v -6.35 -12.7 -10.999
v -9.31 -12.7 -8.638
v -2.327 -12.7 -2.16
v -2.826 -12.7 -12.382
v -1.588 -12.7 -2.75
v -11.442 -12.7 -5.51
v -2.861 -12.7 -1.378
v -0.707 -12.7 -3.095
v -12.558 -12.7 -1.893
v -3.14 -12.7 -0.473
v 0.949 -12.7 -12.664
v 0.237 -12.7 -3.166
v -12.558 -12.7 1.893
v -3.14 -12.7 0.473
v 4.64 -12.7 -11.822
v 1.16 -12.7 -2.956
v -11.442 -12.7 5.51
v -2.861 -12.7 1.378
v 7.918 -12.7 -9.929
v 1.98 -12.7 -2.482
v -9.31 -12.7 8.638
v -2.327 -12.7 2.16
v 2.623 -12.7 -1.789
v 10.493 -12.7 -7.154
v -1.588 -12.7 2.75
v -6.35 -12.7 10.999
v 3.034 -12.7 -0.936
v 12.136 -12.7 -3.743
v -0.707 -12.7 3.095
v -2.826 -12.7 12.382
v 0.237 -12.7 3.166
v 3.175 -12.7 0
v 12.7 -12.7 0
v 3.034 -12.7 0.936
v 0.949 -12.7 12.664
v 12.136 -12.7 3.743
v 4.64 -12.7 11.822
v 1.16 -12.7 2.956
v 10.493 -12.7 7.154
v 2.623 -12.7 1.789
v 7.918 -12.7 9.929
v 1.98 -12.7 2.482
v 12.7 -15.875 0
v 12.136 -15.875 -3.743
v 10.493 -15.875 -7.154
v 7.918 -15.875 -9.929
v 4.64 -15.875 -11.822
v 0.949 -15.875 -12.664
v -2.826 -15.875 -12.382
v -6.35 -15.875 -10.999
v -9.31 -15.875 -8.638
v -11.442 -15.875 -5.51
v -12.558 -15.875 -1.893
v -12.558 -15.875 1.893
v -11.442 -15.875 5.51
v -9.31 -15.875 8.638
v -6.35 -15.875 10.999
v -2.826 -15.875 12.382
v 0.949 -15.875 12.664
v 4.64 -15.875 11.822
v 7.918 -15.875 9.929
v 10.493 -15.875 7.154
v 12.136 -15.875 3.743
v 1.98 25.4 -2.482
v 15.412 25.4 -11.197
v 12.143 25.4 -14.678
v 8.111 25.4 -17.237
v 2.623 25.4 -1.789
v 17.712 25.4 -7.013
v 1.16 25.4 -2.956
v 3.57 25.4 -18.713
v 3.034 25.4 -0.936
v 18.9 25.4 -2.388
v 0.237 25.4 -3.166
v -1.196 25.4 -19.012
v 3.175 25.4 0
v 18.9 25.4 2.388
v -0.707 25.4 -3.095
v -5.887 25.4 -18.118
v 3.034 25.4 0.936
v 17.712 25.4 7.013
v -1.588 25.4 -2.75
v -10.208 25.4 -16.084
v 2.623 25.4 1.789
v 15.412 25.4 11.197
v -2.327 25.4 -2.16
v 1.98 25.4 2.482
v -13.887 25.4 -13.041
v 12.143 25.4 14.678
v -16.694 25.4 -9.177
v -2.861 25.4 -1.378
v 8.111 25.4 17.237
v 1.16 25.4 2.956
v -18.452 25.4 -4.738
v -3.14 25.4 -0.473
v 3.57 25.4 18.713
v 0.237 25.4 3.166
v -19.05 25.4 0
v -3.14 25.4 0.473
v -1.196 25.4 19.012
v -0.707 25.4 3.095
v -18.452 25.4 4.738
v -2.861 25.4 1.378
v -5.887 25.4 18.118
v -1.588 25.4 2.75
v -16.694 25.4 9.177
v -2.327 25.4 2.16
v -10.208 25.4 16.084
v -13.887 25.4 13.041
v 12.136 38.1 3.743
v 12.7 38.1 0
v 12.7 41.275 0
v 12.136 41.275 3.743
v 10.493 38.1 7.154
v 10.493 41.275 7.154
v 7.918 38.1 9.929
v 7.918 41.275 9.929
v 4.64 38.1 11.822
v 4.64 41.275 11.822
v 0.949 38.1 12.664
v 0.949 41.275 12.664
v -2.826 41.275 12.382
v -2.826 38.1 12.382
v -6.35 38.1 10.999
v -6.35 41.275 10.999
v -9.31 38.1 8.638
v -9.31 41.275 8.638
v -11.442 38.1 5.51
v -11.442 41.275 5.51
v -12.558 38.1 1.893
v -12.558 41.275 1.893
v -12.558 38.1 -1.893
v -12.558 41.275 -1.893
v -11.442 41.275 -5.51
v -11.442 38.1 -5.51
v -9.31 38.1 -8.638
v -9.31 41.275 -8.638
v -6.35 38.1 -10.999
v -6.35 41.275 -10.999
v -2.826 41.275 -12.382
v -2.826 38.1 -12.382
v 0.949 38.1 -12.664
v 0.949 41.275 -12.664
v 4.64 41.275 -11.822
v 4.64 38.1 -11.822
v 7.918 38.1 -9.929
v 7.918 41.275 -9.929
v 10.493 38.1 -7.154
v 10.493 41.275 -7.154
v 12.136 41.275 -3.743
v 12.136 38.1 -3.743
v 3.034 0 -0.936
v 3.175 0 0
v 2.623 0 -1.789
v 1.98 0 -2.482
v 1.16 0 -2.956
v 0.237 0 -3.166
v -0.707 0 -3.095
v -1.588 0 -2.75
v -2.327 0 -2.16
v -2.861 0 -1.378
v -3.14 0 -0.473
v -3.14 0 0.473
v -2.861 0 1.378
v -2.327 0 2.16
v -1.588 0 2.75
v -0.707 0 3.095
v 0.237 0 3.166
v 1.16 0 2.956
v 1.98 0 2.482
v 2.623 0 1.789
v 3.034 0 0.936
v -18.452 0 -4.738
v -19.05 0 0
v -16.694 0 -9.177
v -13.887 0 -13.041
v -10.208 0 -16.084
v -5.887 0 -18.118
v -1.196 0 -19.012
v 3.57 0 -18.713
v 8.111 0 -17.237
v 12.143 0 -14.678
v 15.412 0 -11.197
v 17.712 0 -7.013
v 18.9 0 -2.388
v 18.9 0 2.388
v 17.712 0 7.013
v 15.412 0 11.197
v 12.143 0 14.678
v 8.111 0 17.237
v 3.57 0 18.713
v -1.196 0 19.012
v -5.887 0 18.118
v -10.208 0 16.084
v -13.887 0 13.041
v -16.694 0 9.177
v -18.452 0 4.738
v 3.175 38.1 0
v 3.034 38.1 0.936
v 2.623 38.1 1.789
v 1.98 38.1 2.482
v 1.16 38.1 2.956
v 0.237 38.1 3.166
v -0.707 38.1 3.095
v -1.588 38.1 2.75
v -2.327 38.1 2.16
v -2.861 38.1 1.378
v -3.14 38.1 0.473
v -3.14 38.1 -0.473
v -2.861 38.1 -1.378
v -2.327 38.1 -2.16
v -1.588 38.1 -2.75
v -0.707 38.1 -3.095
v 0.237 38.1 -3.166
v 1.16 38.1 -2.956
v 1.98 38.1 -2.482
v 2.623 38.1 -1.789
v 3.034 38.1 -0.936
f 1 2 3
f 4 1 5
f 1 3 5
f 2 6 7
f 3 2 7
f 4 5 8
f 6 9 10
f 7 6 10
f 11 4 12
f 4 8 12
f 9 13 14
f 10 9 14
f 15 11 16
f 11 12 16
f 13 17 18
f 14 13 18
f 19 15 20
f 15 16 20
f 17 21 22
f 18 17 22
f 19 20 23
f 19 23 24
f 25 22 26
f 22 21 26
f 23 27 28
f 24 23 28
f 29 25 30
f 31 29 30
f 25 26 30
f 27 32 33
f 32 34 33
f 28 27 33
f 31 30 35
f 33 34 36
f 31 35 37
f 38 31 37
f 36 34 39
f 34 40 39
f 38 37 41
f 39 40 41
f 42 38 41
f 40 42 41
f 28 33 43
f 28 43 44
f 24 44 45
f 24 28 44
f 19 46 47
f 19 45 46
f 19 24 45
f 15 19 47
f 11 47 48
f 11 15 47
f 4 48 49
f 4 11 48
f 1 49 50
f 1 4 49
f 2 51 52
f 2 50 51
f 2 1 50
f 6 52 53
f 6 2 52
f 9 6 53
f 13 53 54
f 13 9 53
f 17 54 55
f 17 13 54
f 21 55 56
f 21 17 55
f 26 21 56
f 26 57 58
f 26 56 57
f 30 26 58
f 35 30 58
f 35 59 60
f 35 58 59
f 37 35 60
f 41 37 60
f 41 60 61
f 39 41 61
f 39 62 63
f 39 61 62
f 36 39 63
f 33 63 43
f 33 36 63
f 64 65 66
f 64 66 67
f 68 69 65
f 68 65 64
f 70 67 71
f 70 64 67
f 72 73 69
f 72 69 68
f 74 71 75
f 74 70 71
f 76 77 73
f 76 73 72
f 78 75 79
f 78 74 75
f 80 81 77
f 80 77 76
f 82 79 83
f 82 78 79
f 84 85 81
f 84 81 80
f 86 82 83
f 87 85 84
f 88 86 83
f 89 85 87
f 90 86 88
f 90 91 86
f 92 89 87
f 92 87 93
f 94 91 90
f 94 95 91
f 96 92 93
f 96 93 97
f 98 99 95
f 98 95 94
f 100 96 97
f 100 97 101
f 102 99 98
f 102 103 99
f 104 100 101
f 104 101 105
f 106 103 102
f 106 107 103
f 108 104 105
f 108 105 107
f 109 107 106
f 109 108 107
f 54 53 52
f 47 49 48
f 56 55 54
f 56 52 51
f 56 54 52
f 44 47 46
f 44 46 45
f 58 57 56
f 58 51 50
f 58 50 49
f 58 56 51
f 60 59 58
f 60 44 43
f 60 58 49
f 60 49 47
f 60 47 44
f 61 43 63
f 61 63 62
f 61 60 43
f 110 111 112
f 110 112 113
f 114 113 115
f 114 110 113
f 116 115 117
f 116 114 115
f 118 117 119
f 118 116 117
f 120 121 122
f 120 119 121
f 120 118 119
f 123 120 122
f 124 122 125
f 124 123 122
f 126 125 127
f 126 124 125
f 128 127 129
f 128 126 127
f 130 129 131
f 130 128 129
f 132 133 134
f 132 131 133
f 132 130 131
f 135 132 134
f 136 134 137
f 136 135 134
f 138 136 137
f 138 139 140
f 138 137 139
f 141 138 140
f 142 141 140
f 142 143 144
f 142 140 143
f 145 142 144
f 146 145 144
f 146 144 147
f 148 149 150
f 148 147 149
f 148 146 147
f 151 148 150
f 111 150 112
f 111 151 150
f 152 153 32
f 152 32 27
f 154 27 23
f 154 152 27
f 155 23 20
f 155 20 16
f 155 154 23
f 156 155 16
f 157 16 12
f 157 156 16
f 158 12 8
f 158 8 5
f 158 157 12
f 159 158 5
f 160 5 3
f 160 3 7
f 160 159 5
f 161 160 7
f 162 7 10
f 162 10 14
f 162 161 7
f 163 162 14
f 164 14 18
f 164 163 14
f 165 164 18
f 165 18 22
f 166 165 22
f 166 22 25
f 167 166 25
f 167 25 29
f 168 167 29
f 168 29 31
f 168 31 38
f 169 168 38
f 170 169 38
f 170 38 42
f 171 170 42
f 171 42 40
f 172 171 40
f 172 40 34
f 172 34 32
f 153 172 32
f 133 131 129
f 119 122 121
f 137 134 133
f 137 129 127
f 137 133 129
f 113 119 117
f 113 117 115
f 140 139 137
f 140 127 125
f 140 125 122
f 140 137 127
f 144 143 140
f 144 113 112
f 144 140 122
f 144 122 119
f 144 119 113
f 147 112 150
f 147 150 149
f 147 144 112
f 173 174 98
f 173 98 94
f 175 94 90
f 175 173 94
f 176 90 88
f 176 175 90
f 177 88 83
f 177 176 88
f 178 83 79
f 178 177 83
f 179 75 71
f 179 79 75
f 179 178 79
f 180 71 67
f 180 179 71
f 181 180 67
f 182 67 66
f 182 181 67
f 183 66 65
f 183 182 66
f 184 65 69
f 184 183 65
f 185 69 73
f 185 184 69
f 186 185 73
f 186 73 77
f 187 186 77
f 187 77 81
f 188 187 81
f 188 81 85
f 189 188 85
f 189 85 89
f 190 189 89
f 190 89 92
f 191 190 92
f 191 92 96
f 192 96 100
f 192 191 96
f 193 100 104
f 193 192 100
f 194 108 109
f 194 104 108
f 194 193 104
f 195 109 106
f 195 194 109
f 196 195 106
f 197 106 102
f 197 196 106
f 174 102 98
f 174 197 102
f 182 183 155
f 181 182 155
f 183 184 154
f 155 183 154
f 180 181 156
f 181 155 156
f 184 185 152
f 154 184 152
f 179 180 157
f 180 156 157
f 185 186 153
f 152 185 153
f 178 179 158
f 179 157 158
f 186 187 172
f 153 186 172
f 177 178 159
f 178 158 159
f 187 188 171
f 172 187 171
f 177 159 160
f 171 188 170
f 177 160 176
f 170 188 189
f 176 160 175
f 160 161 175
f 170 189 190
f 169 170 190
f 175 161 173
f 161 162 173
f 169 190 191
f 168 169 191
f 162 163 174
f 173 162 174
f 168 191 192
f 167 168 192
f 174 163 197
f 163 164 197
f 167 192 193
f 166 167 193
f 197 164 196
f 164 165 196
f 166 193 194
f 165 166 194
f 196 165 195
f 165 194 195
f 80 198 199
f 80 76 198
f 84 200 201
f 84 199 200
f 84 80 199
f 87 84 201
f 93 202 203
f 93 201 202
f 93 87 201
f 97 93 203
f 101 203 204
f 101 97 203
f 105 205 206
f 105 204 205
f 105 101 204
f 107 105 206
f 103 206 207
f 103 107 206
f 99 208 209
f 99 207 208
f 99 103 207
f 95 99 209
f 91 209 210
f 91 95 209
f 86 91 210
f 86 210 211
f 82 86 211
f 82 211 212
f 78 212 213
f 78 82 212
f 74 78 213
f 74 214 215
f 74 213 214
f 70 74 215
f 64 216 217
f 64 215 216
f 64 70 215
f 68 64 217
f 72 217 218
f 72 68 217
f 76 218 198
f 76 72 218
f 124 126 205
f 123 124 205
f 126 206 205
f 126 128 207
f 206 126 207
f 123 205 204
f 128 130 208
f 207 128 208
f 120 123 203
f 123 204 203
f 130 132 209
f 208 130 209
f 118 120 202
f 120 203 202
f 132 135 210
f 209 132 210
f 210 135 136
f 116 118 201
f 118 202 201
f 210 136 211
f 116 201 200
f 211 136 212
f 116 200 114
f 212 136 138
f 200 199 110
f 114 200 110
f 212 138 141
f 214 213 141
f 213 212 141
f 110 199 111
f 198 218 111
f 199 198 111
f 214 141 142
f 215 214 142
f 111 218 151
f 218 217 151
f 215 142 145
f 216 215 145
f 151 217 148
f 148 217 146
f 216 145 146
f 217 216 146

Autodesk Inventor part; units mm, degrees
ref_plane "YZ Plane" through (0, 0, 0) normal (1, 0, 0) x (0, 1, 0)
ref_plane "XZ Plane" through (0, 0, 0) normal (0, 1, 0) x (-1, 0, 0)
ref_plane "XY Plane" through (0, 0, 0) normal (0, 0, 1) x (1, 0, 0)
sketch "Sketch1" plane through (0, 0, 0) normal (0, 1, 0) x (-1, 0, 0)
  circle A0 centre (0, 0) radius 19.05
  dimension "d0" = 38.1
extrude "Extrusion1" add sketch "Sketch1" along normal blind 25.4
sketch "Sketch2" plane through (0, 25.4, 0) normal (0, 1, 0) x (1, 0, 0)
  circle A0 centre (0, 0) radius 3.175
  dimension "d3" = 6.35
extrude "Extrusion2" add sketch "Sketch2" along normal blind 12.7
extrude "Extrusion3" add sketch "Sketch2" against normal blind 38.1
sketch "Sketch3" plane through (0, 38.1, 0) normal (0, 1, 0) x (1, 0, 0)
  circle A0 centre (0, 0) radius 12.7
  dimension "d8" = 25.4
extrude "Extrusion4" add sketch "Sketch3" along normal blind 3.175
sketch "Sketch4" plane through (0, -12.7, 0) normal (0, -1, 0) x (1, 0, 0)
  circle A0 centre (0, 0) radius 12.7
  dimension "d11" = 25.4
extrude "Extrusion5" add sketch "Sketch4" along normal blind 3.175
properties part number "Gear Wheel"
